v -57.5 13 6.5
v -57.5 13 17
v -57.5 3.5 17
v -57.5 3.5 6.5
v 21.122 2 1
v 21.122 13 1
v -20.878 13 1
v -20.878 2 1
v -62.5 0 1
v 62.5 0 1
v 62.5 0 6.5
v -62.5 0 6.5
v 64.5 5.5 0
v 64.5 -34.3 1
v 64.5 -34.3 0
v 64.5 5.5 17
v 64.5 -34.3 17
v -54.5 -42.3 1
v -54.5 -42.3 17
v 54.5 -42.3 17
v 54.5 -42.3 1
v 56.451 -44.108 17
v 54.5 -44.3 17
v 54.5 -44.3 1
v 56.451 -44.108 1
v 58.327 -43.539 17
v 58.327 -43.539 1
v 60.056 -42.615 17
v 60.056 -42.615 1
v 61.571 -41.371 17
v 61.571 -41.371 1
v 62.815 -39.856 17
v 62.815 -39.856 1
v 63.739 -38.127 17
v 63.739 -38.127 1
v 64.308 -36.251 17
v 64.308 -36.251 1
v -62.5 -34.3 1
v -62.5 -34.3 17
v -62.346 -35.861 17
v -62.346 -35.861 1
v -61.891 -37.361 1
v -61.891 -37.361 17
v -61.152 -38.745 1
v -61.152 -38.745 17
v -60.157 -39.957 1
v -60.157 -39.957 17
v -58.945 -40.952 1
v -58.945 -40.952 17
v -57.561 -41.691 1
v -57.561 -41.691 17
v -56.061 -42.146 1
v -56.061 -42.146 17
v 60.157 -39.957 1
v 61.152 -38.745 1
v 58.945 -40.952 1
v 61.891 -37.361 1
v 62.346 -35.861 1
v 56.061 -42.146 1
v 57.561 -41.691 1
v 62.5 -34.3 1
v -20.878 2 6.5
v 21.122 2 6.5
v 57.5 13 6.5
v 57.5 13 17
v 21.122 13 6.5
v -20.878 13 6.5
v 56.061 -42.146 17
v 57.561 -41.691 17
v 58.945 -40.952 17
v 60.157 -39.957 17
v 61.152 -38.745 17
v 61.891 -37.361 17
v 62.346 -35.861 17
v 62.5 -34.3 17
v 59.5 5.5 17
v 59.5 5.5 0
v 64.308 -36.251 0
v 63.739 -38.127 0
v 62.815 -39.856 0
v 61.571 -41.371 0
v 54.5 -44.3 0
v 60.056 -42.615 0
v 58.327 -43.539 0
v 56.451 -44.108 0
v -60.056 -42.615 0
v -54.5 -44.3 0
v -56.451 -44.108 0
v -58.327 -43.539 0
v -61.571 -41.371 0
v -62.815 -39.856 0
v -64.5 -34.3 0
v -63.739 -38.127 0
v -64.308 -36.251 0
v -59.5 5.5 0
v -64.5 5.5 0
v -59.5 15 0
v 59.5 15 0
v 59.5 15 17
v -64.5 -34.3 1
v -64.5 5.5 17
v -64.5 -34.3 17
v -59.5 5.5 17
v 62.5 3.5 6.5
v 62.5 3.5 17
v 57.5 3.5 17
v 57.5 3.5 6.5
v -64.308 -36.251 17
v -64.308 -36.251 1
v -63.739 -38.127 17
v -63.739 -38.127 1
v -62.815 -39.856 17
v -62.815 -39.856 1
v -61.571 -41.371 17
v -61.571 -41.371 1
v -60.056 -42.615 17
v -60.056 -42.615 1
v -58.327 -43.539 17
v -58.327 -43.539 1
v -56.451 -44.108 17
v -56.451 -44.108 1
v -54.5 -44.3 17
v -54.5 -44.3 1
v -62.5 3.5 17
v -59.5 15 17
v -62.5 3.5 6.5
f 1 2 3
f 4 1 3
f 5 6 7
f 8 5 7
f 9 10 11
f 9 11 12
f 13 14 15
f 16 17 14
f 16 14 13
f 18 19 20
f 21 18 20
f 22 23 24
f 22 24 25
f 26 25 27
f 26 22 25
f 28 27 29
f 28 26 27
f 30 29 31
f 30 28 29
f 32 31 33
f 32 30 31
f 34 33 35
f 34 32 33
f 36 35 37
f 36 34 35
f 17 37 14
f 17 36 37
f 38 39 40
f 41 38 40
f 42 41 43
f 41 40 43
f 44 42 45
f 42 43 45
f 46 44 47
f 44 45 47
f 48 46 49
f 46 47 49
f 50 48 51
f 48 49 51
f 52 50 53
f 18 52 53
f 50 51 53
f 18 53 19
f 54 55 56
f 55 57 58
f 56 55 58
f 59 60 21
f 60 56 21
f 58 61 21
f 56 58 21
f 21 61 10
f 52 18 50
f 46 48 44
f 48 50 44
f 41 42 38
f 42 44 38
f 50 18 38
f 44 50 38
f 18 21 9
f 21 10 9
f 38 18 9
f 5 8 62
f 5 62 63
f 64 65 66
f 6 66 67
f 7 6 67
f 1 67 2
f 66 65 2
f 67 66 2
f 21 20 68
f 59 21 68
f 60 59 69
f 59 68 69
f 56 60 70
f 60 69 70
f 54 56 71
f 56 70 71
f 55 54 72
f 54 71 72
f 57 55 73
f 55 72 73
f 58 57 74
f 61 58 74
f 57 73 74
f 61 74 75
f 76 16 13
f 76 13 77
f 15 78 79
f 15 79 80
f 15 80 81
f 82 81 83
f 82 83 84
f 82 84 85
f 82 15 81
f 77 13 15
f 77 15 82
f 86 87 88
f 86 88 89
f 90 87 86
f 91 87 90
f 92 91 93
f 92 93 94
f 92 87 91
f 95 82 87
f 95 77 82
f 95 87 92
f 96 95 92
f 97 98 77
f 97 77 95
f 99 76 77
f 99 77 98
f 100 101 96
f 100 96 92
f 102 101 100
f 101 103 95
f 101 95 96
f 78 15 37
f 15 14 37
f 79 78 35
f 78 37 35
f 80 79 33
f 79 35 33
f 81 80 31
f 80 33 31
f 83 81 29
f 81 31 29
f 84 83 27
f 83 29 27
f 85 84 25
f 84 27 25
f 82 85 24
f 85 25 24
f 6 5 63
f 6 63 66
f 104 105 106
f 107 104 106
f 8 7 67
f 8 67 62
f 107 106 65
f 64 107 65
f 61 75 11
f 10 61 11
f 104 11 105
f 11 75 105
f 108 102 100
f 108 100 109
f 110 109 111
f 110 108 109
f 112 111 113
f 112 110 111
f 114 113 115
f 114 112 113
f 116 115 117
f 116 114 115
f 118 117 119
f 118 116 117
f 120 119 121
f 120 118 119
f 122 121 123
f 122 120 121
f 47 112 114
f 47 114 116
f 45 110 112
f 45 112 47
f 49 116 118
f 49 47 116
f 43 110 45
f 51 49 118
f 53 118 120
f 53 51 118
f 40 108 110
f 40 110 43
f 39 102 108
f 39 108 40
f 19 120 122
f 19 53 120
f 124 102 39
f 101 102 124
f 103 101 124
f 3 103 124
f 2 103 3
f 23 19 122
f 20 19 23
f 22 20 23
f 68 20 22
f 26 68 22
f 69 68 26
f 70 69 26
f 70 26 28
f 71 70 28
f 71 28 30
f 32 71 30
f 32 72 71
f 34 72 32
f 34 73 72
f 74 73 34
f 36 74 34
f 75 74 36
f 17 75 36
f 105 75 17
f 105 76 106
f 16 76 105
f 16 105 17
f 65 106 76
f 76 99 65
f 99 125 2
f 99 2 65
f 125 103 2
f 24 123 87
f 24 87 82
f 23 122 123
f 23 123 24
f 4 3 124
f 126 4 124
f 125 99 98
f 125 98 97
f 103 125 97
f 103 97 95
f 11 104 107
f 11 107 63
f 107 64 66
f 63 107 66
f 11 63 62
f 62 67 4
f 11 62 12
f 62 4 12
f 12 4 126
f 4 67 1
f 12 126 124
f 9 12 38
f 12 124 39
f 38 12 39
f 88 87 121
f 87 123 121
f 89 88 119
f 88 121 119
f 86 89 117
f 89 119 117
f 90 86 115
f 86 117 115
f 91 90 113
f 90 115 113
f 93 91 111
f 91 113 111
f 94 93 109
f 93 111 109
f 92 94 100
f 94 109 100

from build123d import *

# Parameters (mm, degrees)
BOSS_EXTRUDE1_DEPTH = 1
FILLET1_R           = 10
BOSS_EXTRUDE2_START = 16
BOSS_EXTRUDE2_DEPTH = 16
BOSS_EXTRUDE3_DEPTH = 5.5


with BuildPart() as part:
    # Sketch1 → Boss-Extrude1 (new body)
    with BuildSketch(Plane.XY):
        Polygon((-59.5, 15), (59.5, 15), (59.5, 5.5), (64.5, 5.5), (64.5, -44.3), (-64.5, -44.3), (-64.5, 5.5), (-59.5, 5.5), align=None)
    extrude(amount=BOSS_EXTRUDE1_DEPTH)

    # Fillet1
    fillet1_edges = [part.edges().sort_by_distance(p)[0] for p in [
        (64.5, -44.3, 0.5),
        (-64.5, -44.3, 0.5),
    ]]
    fillet(fillet1_edges, radius=FILLET1_R)

    # Sketch2 → Boss-Extrude2 (add)
    with BuildSketch(Plane.XY.offset(1).offset(BOSS_EXTRUDE2_START)):
        with BuildLine():
            Line((59.5, 5.5), (59.5, 15))
            Line((59.5, 15), (-59.5, 15))
            Line((-59.5, 15), (-59.5, 5.5))
            Line((-59.5, 5.5), (-64.5, 5.5))
            Line((-64.5, 5.5), (-64.5, -34.3))
            ThreePointArc((-64.5, -34.3), (-61.571067812, -41.371067812), (-54.5, -44.3))
            Line((-54.5, -44.3), (54.5, -44.3))
            ThreePointArc((54.5, -44.3), (61.571067812, -41.371067812), (64.5, -34.3))
            Line((64.5, -34.3), (64.5, 5.5))
            Line((64.5, 5.5), (59.5, 5.5))
        make_face()
        with BuildLine():
            Line((-54.5, -42.3), (54.5, -42.3))
            ThreePointArc((54.5, -42.3), (60.156854249, -39.956854249), (62.5, -34.3))
            Line((62.5, -34.3), (62.5, 3.5))
            Line((62.5, 3.5), (57.5, 3.5))
            Line((57.5, 3.5), (57.5, 13))
            Line((57.5, 13), (-57.5, 13))
            Line((-57.5, 13), (-57.5, 3.5))
            Line((-57.5, 3.5), (-62.5, 3.5))
            Line((-62.5, 3.5), (-62.5, -34.3))
            ThreePointArc((-62.5, -34.3), (-60.156854249, -39.956854249), (-54.5, -42.3))
        make_face(mode=Mode.SUBTRACT)
    extrude(amount=-BOSS_EXTRUDE2_DEPTH)

    # Sketch3 → Boss-Extrude3 (add)
    with BuildSketch(Plane.XY.offset(1)):
        Polygon((-20.877513704, 2), (21.122486296, 2), (21.122486296, 13), (57.5, 13), (57.5, 3.5), (62.5, 3.5), (62.5, 0), (-62.5, 0), (-62.5, 3.5), (-57.5, 3.5), (-57.5, 13), (-20.877513704, 13), align=None)
    extrude(amount=BOSS_EXTRUDE3_DEPTH)


solid = part.part
